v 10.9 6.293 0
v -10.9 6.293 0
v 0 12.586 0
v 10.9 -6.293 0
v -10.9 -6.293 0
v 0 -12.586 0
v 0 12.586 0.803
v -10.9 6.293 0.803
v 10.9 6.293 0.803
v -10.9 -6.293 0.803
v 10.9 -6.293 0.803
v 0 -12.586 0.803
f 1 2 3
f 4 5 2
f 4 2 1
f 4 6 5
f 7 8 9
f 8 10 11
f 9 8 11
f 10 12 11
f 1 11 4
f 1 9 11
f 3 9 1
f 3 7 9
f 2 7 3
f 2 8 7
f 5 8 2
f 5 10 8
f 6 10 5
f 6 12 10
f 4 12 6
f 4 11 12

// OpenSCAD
// file: HexUtils.scad
// Basic computations and shapes for working with hexes
// see https://www.redblobgames.com/grids/hexagons/ for detailed description
//
// Hexes are referenced by axial coordinates (row is normal, col is tilted by 60 dergees)
//  /\/\
// | | |
//  \/\/

default_hex_size = 25.4;
default_side = default_hex_size / sqrt(3); // for hexes that fit an inscribed circle (or miniature base) of 1"

q_basis = [0,1]; // horizontal unit vector
r_basis = [1,1]; // diagonal unit vector

function default(value, default) = (value == undef) ? default : value;
function range(v) = [0:(len(v)-1)];
function is_odd(x) = (x % 2) != 0;
function is_even(x) = [x % 2] == 0;

/*
 Convert axial coordinates to cubic
*/
function axial_to_cubic(axial) = [axial.x, -axial.x - axial.y, axial.y];

/*
 Convert cubic to axial
*/
function cubic_to_axial(cubic) = [cubic.x, cubic.z];

/*
 half-step in x and y directions
*/
function dx(size=default_hex_size) = 0.5 * size;
function dy(size=default_hex_size) = 0.5 * size / sqrt(3);

/*
 compute side length for a given hex size
*/
function size_to_side(size) = size / sqrt(3);

/*
 compute hex size or a given side length
*/
function side_to_size(side) = side * sqrt(3);

/*
 Distance between two axial points
 */
function axial_distance(a, b) =
    (abs(a.x -b.x) + abs(a.x + a.y - b.x - b.y) + abs(a.y - b.y)) / 2;

/*
 Convert axial hex coordinates to cartesian coordinates
*/
function axial_to_xy(axial, size) = [dx(size) * (2*axial.x + axial.y), dy(size) * 3 * axial.y, 0];

/*
 Create a 2d hex with center at the origin
*/
module hex_shape(size) {
    _dx = dx(size);
    _dy = dy(size);
    polygon([[0,2*_dy],[_dx,_dy],[_dx,-_dy],[0,-2*_dy],[-_dx,-_dy],[-_dx,_dy]]);
}

module beveled_hex_shape(size) {
    bevel_width = 0.5;
    _dx = dx(size-bevel_width);
    _dy = dy(size-bevel_width);
    offset(r=bevel_width/2, chamfer=true) {
        polygon([[0,2*_dy],[_dx,_dy],[_dx,-_dy],[0,-2*_dy],[-_dx,-_dy],[-_dx,_dy]]);
    }
}

/*
 Create a 3d hexagonal prism/truncated pyramid with center at the origin
*/
module hex_prism(height, size, size1, size2, center) {
    _size1 = (size1 != undef) ? size1 : default(size, default_hex_size);
    _size2 = (size2 != undef) ? size2 : default(size, default_hex_size);
    linear_extrude(height=height, center=default(center,false), scale=_size2/_size1) {
        hex_shape(_size1);
    }
}


function hexes_per_megahex(size) =
    let(
        _size = (size[0] == undef) ? [size, size] : size,
        small = min(_size), large = max(_size))
    3*small*small - 3*small + 1 + (large-small)*small;

function tri(n) = n*(n+1) / 2;

function range_from(size) =
    let(
        actual_size = (size[0] == undef) ? size : len(size))
    [0:(actual_size-1)];

/*
 Returns the ordinal value of the start of a row for a hex tile of the specified size
 For a hex of size 2:
    row  2:     16  17  18        offset = 16
    row  1:   12  13  14  15      offset = 12     5 6
    row  0: 07  08  09  10  11    offset =  7    2 3 4
    row -1:   03  04  05  06      offset =  3     0 1
    row -2:     00  01  02        offset =  0
*/
//function hex_row_offset(size, row) =
//    (row < size)
//        ? tri(2*size + row-2) - tri(size-1)
//        : hexes_per_megahex(size) - tri(2*size - row) + tri(size-1);

function hexes_per_row(size) =
    let(
        w = 2*size.x-1)
    [for (i = [0:(size.y)-1]) w-i];

/*
 Returns the row for a given offset, with the center row being row 0
*/
function hex_offset_to_row(size, offset) =
    (offset > hexes_per_megahex(size) / 2)
        ? -hex_offset_to_row(size, hexes_per_megahex(size) - offset - 1)
        : (offset < size.x)
            ? 1-size.x
            : 2 + hex_offset_to_row([size.x + 1, size.y], offset - size.x);

/*
 Returns the column for a given offset, with the center hex as column 0
 size=3 offset=3
    size=4, offset=0 => 0-4+1 => -3
*/
function hex_offset_to_column(size, offset) =
    (offset > hexes_per_megahex(size) / 2)
        ? -hex_offset_to_column(size, hexes_per_megahex(size) - offset - 1)
        : (offset < size.x)
            ? offset
            : hex_offset_to_column([size.x + 1, size.y], offset - size.x) - 1;

/*
 Returns the axial coodinates of a given hex offset value, assuming the center hex is 0,0
*/
function hex_offset_to_axial(size, offset) =
    let (
        _size = (size[0] == undef) ? size : size.x,
        row = -hex_offset_to_row(_size, offset),
        col = hex_offset_to_column(_size, offset) - row
    )
    [col, row];

/*
 Returns the axial coordinates of a given rectangular offset value/ Assumes 0,0 is offset 0 at lower left
*/
function rectangle_offset_to_axial(size, offset) =
    let(
        x = offset % size.x,
        y = (offset - x) / size.x)
    [x - (y + (is_odd(y) ? 1 : 0)) / 2, y];

function is_in_rect_tile(size, pos) =
    (0 <= pos.x) && (pos.x < size.x) && (0 <= pos.y) && (pos.y < size.y);

function is_in_hex_tile(size, pos) = axial_distance([0, 0], pos) < size;

function is_in_semi_hex_tile(size, pos) = is_in_hex_tile(size, pos) && pos.y >= 0;

// Direction 
ANGLES_FOR_DIRECTION = [ 0, 60, 120, 180, 240, 300 ];
//STEP_FOR_DIRECTION = [ [1,0], [-1,1], [-1,0], [0,-1], [1,-1], [0,1] ];
STEP_FOR_DIRECTION = [ [1,0], [0,1], [-1,1], [-1,0], [0,-1], [1,-1] ];

// convert a direction symbol into a unit vector
//function step(dir) =
//    (dir == "E") ? [1,0]
//        : (dir == "SE") ? [1,-1]
//        : (dir == "SW") ? [0,-1]
//        : (dir == "W") ? [-1,0]
//        : (dir == "NW") ? [-1,1]
//        : dir == "NE") ? [0,1]
//        : [];


function hex_positions(size) =
    let (_size = (size[0] == undef) ? [size, size] : size)
    [for (i = range_from(hexes_per_megahex(_size.x))) hex_offset_to_axial(_size.x, i)];

function rect_positions(size) =
    let (_size = (size[0] == undef) ? [size, size] : size)
    [for (i = range_from(size.x * size.y)) rectangle_offset_to_axial(size, i)];

function semi_hex_positions(size) =
    let(
        _size = (size[0] == undef) ? [size, size] : size,
        middle_row_count = 2*_size.x - 1,
        hex_count = (hexes_per_megahex(_size.x) + middle_row_count) / 2)
    [for (i = range_from(hex_count)) hex_offset_to_axial(_size.x, i)];
// main file
/*
  Convert images to surfaces for export and simplification for use as hex top textures
*/

include <HexTiles.scad>

module texture(terrain) {
    union() {
        linear_extrude(height=grid_line_depth+fudge) hex_shape(top_size);
        translate([0,0,grid_line_depth]) top_texture(terrain=terrain);
    }
}

texture(["stonesx", 64 , 5]);
